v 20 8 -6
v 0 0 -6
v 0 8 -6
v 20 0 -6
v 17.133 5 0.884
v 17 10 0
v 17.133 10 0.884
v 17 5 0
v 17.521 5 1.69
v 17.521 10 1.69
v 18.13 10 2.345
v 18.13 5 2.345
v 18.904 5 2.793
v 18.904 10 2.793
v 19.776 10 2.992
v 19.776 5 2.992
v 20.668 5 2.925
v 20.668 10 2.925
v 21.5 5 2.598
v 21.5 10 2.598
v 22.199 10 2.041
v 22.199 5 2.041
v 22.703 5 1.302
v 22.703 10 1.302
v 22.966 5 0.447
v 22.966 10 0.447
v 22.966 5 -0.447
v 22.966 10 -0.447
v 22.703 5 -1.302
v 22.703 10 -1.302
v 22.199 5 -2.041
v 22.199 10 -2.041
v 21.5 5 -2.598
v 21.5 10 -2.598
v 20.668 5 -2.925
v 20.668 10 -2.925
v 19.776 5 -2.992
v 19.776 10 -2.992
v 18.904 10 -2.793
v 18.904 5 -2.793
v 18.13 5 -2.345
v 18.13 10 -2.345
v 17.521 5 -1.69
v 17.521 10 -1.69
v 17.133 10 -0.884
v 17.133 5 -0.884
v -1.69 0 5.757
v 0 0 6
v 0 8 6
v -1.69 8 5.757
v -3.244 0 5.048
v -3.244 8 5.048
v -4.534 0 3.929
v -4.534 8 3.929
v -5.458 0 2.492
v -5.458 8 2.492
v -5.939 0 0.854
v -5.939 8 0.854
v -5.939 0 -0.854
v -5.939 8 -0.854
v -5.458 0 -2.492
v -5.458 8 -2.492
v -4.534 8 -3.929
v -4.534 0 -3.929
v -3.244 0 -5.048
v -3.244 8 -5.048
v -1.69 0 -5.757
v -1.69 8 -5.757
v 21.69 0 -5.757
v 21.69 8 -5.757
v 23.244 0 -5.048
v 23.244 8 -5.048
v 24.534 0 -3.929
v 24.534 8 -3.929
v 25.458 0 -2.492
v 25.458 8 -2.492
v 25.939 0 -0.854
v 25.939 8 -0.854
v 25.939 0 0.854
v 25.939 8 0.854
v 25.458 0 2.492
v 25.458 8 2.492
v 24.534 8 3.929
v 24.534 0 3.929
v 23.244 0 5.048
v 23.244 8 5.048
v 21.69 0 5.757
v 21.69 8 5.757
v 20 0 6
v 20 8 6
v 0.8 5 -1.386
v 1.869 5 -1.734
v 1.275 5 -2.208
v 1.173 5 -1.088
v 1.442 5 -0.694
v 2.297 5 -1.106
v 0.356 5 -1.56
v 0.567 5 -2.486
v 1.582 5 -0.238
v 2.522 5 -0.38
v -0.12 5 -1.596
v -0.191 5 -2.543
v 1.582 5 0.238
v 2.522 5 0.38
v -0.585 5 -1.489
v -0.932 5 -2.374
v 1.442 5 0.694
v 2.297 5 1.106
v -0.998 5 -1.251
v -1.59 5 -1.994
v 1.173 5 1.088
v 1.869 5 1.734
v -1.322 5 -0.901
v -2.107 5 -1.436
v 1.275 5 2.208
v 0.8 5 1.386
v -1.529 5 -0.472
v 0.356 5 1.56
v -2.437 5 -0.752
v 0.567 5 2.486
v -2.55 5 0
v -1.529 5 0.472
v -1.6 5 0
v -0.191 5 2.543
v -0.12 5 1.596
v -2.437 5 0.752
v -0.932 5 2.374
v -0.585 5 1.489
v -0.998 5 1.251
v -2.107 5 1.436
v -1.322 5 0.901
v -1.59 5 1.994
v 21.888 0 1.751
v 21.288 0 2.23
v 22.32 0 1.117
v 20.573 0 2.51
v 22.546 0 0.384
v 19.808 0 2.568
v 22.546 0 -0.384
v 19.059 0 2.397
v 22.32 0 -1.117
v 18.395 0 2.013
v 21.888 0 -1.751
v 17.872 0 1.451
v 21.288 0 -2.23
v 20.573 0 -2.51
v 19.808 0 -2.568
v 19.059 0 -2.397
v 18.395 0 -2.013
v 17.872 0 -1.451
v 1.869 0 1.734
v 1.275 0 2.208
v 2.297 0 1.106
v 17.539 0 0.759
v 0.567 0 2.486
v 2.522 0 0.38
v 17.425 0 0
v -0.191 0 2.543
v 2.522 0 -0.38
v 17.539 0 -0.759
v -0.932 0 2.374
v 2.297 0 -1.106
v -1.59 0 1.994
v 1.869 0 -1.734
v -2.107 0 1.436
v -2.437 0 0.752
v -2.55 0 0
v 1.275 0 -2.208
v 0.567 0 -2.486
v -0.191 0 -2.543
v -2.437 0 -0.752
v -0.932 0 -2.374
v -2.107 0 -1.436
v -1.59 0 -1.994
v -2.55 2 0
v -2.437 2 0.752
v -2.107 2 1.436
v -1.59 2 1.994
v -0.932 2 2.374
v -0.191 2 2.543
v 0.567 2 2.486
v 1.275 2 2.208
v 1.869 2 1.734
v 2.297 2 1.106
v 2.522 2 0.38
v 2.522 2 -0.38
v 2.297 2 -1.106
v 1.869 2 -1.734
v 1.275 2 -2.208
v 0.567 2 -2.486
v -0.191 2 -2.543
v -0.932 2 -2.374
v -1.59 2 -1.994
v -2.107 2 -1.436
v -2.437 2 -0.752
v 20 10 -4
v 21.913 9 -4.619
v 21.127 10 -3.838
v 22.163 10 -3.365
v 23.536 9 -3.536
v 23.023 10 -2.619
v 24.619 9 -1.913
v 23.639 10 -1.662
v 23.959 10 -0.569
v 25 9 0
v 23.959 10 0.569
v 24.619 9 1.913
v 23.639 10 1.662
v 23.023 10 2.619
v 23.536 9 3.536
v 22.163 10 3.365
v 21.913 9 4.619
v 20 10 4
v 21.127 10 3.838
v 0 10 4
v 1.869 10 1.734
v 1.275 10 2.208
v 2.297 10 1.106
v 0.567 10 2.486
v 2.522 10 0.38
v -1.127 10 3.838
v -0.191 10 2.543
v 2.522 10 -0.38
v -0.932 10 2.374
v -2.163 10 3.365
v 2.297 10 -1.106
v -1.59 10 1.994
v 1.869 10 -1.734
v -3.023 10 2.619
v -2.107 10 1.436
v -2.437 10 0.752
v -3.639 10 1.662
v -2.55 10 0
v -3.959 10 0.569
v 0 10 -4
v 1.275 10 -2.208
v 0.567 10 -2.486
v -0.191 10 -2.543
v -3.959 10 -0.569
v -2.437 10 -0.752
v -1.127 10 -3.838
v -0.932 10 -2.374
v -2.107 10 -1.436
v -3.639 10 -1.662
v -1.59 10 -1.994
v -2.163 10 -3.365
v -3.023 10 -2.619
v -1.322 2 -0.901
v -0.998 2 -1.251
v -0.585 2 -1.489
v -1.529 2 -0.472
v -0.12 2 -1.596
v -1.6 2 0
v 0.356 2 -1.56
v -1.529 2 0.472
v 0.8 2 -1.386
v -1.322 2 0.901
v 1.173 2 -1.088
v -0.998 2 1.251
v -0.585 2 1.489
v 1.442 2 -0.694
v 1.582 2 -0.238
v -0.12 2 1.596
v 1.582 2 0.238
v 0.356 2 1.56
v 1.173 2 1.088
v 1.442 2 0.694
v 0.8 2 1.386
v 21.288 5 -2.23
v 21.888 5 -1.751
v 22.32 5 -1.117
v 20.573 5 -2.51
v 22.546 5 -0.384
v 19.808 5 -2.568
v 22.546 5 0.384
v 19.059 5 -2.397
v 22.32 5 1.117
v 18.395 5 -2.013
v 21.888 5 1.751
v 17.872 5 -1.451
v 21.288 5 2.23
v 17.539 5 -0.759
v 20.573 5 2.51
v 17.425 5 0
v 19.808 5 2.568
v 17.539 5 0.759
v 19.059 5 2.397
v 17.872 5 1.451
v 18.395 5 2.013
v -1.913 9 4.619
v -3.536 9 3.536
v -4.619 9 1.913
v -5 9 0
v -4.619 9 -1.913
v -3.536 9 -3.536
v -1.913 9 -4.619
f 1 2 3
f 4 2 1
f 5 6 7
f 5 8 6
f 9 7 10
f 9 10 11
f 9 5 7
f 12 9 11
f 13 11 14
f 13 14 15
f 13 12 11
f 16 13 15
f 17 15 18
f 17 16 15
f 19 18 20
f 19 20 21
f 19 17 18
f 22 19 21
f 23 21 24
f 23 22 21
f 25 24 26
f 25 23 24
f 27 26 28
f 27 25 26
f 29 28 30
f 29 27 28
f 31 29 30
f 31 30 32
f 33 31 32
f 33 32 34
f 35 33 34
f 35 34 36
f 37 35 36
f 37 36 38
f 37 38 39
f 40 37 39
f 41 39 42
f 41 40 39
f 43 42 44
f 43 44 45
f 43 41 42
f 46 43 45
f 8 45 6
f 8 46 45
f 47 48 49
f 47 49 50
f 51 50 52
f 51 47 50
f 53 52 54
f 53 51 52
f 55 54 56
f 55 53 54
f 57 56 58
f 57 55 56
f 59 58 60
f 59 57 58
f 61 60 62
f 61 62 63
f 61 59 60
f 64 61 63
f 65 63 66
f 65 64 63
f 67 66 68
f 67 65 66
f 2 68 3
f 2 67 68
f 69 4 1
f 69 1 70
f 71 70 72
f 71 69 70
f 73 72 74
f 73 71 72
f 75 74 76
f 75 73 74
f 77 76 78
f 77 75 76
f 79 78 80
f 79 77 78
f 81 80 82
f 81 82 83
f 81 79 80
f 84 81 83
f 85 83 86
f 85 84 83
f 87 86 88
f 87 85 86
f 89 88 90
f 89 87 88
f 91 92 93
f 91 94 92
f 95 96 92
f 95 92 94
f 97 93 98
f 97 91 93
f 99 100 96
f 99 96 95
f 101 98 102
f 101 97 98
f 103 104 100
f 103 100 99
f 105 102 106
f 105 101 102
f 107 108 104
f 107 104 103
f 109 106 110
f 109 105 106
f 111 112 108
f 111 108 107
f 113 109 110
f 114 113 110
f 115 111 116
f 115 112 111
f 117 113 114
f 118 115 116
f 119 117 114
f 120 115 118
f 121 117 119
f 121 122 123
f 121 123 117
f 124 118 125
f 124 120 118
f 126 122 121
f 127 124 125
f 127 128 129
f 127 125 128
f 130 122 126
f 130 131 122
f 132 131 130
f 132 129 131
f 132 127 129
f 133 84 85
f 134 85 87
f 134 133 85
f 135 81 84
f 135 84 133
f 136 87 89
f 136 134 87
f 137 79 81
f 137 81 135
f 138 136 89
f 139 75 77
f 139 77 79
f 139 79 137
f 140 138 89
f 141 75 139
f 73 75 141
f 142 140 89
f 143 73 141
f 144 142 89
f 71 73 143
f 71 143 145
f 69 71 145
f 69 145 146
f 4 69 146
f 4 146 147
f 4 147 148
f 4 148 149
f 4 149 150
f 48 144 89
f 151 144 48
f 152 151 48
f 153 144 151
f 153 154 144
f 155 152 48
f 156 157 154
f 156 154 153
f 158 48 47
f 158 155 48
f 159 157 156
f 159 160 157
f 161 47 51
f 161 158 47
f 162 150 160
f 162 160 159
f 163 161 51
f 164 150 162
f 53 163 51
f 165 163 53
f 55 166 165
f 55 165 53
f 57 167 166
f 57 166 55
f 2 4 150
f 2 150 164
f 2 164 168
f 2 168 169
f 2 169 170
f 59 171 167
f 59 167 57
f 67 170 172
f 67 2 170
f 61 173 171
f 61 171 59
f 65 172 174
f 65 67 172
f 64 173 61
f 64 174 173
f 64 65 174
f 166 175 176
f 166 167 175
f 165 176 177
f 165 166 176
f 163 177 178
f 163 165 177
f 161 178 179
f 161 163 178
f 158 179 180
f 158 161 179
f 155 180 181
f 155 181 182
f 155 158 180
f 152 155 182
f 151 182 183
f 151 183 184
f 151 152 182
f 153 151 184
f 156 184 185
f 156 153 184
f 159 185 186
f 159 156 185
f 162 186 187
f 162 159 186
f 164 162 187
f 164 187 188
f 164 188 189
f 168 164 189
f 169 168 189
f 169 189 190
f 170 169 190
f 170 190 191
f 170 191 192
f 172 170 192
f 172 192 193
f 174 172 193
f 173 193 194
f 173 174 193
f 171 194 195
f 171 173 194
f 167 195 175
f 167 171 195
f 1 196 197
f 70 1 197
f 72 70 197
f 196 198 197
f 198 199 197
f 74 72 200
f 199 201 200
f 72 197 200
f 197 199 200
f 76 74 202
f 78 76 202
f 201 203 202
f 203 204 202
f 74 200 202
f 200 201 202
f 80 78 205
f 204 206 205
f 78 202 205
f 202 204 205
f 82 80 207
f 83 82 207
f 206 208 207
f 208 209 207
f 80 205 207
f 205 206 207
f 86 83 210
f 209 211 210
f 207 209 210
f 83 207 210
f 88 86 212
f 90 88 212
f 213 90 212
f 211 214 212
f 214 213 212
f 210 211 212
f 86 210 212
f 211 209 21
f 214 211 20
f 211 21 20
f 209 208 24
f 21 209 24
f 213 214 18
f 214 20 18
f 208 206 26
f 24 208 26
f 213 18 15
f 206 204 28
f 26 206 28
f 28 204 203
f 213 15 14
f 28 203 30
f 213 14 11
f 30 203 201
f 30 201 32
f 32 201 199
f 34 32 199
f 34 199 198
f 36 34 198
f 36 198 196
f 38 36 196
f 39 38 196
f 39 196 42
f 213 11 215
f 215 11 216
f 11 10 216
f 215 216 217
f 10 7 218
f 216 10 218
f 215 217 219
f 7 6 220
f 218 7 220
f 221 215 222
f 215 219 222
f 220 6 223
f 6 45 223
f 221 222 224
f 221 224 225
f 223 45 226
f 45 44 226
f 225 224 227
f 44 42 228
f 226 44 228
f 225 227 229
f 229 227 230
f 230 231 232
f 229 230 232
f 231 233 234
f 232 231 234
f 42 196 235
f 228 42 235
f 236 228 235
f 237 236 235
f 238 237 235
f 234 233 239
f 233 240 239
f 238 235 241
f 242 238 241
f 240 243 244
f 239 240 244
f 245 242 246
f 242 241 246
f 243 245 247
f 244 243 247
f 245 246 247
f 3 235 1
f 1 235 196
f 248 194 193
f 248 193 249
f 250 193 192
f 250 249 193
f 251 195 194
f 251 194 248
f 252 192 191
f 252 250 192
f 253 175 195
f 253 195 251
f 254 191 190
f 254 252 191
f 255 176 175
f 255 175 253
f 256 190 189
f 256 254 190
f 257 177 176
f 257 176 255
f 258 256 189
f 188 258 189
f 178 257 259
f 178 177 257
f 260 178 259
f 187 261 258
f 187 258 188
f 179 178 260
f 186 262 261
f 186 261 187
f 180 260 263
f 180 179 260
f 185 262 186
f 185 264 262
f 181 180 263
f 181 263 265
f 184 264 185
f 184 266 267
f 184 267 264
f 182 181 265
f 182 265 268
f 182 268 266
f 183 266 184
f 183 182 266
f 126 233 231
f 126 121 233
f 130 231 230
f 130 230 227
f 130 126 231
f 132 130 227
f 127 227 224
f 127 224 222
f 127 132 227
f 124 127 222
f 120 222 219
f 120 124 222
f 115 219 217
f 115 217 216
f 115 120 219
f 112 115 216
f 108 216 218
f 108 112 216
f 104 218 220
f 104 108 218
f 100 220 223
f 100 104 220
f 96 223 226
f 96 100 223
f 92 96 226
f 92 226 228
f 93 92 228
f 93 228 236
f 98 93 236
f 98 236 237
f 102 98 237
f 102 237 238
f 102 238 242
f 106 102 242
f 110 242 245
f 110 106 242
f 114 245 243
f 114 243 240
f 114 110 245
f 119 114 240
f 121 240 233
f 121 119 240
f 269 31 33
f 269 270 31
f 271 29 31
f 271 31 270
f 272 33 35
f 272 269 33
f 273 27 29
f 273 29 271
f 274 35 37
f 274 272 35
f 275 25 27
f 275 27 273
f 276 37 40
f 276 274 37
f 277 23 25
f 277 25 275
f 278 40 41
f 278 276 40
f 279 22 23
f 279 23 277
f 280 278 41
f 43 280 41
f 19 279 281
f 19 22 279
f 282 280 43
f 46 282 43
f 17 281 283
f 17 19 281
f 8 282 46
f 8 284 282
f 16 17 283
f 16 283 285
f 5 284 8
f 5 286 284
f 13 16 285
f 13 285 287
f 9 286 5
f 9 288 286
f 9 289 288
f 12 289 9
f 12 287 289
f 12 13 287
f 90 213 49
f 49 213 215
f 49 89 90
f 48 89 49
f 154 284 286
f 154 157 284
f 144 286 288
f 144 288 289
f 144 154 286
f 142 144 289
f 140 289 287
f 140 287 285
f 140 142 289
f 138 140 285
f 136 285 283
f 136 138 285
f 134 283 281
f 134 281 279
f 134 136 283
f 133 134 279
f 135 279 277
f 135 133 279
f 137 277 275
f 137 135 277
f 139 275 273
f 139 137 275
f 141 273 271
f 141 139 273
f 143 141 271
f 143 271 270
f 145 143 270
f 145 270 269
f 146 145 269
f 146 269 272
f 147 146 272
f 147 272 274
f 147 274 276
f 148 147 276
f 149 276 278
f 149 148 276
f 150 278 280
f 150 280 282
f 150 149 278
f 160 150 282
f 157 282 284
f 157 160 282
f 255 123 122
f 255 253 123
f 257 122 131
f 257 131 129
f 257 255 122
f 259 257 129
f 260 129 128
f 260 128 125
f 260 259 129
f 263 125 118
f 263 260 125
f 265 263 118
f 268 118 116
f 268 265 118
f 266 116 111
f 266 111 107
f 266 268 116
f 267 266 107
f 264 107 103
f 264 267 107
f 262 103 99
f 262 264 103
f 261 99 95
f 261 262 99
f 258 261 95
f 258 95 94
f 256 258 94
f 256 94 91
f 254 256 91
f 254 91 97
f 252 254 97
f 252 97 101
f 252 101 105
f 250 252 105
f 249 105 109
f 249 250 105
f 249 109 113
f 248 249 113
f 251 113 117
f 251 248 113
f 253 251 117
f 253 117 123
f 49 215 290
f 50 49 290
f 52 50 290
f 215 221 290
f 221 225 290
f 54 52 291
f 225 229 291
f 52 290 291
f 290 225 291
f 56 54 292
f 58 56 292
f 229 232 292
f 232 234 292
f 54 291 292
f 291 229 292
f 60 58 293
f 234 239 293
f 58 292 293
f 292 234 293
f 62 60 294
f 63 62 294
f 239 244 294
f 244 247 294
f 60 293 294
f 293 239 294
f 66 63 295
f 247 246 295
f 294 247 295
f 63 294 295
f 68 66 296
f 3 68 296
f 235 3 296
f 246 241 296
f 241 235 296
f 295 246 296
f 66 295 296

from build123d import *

# Parameters (mm, degrees)
EXTRUDE_1_DEPTH = 10
CHAMFER_1_SIZE  = 2


with BuildPart() as part:
    # 草图1 → 凸台-拉伸1 (new body)
    with BuildSketch(Plane(origin=(0, 0, 0), x_dir=(1, 0, 0), z_dir=(0, 1, 0))):
        with BuildLine():
            Line((0, 6), (20, 6))
            ThreePointArc((20, 6), (26, 0), (20, -6))
            Line((20, -6), (0, -6))
            ThreePointArc((0, -6), (-6, 0), (0, 6))
        make_face()
    extrude(amount=EXTRUDE_1_DEPTH)

    # 草图2 → 切除-旋转1 (revolve, cut)
    with BuildSketch(Plane.XY):
        Polygon((0, 10), (-2.55, 10), (-2.55, 5), (-1.6, 5), (-1.6, 2), (-2.55, 2), (-2.55, 0), (0, 0), align=None)
    revolve(axis=Axis((0, 0, 0), (0, 1, 0)), mode=Mode.SUBTRACT)

    # 草图4 → 切除-旋转2 (revolve, cut)
    with BuildSketch(Plane.XY):
        Polygon((20, 10), (17, 10), (17, 5), (17.425, 5), (17.425, 0), (20, 0), align=None)
    revolve(axis=Axis((20, 0, 0), (0, 1, 0)), mode=Mode.SUBTRACT)

    # 倒角1
    chamfer_1_edges = [part.edges().sort_by_distance(p)[0] for p in [
        (26, 10, 0),
        (10, 10, -6),
        (-6, 10, 0),
        (10, 10, 6),
    ]]
    chamfer(chamfer_1_edges, length=CHAMFER_1_SIZE)


solid = part.part
